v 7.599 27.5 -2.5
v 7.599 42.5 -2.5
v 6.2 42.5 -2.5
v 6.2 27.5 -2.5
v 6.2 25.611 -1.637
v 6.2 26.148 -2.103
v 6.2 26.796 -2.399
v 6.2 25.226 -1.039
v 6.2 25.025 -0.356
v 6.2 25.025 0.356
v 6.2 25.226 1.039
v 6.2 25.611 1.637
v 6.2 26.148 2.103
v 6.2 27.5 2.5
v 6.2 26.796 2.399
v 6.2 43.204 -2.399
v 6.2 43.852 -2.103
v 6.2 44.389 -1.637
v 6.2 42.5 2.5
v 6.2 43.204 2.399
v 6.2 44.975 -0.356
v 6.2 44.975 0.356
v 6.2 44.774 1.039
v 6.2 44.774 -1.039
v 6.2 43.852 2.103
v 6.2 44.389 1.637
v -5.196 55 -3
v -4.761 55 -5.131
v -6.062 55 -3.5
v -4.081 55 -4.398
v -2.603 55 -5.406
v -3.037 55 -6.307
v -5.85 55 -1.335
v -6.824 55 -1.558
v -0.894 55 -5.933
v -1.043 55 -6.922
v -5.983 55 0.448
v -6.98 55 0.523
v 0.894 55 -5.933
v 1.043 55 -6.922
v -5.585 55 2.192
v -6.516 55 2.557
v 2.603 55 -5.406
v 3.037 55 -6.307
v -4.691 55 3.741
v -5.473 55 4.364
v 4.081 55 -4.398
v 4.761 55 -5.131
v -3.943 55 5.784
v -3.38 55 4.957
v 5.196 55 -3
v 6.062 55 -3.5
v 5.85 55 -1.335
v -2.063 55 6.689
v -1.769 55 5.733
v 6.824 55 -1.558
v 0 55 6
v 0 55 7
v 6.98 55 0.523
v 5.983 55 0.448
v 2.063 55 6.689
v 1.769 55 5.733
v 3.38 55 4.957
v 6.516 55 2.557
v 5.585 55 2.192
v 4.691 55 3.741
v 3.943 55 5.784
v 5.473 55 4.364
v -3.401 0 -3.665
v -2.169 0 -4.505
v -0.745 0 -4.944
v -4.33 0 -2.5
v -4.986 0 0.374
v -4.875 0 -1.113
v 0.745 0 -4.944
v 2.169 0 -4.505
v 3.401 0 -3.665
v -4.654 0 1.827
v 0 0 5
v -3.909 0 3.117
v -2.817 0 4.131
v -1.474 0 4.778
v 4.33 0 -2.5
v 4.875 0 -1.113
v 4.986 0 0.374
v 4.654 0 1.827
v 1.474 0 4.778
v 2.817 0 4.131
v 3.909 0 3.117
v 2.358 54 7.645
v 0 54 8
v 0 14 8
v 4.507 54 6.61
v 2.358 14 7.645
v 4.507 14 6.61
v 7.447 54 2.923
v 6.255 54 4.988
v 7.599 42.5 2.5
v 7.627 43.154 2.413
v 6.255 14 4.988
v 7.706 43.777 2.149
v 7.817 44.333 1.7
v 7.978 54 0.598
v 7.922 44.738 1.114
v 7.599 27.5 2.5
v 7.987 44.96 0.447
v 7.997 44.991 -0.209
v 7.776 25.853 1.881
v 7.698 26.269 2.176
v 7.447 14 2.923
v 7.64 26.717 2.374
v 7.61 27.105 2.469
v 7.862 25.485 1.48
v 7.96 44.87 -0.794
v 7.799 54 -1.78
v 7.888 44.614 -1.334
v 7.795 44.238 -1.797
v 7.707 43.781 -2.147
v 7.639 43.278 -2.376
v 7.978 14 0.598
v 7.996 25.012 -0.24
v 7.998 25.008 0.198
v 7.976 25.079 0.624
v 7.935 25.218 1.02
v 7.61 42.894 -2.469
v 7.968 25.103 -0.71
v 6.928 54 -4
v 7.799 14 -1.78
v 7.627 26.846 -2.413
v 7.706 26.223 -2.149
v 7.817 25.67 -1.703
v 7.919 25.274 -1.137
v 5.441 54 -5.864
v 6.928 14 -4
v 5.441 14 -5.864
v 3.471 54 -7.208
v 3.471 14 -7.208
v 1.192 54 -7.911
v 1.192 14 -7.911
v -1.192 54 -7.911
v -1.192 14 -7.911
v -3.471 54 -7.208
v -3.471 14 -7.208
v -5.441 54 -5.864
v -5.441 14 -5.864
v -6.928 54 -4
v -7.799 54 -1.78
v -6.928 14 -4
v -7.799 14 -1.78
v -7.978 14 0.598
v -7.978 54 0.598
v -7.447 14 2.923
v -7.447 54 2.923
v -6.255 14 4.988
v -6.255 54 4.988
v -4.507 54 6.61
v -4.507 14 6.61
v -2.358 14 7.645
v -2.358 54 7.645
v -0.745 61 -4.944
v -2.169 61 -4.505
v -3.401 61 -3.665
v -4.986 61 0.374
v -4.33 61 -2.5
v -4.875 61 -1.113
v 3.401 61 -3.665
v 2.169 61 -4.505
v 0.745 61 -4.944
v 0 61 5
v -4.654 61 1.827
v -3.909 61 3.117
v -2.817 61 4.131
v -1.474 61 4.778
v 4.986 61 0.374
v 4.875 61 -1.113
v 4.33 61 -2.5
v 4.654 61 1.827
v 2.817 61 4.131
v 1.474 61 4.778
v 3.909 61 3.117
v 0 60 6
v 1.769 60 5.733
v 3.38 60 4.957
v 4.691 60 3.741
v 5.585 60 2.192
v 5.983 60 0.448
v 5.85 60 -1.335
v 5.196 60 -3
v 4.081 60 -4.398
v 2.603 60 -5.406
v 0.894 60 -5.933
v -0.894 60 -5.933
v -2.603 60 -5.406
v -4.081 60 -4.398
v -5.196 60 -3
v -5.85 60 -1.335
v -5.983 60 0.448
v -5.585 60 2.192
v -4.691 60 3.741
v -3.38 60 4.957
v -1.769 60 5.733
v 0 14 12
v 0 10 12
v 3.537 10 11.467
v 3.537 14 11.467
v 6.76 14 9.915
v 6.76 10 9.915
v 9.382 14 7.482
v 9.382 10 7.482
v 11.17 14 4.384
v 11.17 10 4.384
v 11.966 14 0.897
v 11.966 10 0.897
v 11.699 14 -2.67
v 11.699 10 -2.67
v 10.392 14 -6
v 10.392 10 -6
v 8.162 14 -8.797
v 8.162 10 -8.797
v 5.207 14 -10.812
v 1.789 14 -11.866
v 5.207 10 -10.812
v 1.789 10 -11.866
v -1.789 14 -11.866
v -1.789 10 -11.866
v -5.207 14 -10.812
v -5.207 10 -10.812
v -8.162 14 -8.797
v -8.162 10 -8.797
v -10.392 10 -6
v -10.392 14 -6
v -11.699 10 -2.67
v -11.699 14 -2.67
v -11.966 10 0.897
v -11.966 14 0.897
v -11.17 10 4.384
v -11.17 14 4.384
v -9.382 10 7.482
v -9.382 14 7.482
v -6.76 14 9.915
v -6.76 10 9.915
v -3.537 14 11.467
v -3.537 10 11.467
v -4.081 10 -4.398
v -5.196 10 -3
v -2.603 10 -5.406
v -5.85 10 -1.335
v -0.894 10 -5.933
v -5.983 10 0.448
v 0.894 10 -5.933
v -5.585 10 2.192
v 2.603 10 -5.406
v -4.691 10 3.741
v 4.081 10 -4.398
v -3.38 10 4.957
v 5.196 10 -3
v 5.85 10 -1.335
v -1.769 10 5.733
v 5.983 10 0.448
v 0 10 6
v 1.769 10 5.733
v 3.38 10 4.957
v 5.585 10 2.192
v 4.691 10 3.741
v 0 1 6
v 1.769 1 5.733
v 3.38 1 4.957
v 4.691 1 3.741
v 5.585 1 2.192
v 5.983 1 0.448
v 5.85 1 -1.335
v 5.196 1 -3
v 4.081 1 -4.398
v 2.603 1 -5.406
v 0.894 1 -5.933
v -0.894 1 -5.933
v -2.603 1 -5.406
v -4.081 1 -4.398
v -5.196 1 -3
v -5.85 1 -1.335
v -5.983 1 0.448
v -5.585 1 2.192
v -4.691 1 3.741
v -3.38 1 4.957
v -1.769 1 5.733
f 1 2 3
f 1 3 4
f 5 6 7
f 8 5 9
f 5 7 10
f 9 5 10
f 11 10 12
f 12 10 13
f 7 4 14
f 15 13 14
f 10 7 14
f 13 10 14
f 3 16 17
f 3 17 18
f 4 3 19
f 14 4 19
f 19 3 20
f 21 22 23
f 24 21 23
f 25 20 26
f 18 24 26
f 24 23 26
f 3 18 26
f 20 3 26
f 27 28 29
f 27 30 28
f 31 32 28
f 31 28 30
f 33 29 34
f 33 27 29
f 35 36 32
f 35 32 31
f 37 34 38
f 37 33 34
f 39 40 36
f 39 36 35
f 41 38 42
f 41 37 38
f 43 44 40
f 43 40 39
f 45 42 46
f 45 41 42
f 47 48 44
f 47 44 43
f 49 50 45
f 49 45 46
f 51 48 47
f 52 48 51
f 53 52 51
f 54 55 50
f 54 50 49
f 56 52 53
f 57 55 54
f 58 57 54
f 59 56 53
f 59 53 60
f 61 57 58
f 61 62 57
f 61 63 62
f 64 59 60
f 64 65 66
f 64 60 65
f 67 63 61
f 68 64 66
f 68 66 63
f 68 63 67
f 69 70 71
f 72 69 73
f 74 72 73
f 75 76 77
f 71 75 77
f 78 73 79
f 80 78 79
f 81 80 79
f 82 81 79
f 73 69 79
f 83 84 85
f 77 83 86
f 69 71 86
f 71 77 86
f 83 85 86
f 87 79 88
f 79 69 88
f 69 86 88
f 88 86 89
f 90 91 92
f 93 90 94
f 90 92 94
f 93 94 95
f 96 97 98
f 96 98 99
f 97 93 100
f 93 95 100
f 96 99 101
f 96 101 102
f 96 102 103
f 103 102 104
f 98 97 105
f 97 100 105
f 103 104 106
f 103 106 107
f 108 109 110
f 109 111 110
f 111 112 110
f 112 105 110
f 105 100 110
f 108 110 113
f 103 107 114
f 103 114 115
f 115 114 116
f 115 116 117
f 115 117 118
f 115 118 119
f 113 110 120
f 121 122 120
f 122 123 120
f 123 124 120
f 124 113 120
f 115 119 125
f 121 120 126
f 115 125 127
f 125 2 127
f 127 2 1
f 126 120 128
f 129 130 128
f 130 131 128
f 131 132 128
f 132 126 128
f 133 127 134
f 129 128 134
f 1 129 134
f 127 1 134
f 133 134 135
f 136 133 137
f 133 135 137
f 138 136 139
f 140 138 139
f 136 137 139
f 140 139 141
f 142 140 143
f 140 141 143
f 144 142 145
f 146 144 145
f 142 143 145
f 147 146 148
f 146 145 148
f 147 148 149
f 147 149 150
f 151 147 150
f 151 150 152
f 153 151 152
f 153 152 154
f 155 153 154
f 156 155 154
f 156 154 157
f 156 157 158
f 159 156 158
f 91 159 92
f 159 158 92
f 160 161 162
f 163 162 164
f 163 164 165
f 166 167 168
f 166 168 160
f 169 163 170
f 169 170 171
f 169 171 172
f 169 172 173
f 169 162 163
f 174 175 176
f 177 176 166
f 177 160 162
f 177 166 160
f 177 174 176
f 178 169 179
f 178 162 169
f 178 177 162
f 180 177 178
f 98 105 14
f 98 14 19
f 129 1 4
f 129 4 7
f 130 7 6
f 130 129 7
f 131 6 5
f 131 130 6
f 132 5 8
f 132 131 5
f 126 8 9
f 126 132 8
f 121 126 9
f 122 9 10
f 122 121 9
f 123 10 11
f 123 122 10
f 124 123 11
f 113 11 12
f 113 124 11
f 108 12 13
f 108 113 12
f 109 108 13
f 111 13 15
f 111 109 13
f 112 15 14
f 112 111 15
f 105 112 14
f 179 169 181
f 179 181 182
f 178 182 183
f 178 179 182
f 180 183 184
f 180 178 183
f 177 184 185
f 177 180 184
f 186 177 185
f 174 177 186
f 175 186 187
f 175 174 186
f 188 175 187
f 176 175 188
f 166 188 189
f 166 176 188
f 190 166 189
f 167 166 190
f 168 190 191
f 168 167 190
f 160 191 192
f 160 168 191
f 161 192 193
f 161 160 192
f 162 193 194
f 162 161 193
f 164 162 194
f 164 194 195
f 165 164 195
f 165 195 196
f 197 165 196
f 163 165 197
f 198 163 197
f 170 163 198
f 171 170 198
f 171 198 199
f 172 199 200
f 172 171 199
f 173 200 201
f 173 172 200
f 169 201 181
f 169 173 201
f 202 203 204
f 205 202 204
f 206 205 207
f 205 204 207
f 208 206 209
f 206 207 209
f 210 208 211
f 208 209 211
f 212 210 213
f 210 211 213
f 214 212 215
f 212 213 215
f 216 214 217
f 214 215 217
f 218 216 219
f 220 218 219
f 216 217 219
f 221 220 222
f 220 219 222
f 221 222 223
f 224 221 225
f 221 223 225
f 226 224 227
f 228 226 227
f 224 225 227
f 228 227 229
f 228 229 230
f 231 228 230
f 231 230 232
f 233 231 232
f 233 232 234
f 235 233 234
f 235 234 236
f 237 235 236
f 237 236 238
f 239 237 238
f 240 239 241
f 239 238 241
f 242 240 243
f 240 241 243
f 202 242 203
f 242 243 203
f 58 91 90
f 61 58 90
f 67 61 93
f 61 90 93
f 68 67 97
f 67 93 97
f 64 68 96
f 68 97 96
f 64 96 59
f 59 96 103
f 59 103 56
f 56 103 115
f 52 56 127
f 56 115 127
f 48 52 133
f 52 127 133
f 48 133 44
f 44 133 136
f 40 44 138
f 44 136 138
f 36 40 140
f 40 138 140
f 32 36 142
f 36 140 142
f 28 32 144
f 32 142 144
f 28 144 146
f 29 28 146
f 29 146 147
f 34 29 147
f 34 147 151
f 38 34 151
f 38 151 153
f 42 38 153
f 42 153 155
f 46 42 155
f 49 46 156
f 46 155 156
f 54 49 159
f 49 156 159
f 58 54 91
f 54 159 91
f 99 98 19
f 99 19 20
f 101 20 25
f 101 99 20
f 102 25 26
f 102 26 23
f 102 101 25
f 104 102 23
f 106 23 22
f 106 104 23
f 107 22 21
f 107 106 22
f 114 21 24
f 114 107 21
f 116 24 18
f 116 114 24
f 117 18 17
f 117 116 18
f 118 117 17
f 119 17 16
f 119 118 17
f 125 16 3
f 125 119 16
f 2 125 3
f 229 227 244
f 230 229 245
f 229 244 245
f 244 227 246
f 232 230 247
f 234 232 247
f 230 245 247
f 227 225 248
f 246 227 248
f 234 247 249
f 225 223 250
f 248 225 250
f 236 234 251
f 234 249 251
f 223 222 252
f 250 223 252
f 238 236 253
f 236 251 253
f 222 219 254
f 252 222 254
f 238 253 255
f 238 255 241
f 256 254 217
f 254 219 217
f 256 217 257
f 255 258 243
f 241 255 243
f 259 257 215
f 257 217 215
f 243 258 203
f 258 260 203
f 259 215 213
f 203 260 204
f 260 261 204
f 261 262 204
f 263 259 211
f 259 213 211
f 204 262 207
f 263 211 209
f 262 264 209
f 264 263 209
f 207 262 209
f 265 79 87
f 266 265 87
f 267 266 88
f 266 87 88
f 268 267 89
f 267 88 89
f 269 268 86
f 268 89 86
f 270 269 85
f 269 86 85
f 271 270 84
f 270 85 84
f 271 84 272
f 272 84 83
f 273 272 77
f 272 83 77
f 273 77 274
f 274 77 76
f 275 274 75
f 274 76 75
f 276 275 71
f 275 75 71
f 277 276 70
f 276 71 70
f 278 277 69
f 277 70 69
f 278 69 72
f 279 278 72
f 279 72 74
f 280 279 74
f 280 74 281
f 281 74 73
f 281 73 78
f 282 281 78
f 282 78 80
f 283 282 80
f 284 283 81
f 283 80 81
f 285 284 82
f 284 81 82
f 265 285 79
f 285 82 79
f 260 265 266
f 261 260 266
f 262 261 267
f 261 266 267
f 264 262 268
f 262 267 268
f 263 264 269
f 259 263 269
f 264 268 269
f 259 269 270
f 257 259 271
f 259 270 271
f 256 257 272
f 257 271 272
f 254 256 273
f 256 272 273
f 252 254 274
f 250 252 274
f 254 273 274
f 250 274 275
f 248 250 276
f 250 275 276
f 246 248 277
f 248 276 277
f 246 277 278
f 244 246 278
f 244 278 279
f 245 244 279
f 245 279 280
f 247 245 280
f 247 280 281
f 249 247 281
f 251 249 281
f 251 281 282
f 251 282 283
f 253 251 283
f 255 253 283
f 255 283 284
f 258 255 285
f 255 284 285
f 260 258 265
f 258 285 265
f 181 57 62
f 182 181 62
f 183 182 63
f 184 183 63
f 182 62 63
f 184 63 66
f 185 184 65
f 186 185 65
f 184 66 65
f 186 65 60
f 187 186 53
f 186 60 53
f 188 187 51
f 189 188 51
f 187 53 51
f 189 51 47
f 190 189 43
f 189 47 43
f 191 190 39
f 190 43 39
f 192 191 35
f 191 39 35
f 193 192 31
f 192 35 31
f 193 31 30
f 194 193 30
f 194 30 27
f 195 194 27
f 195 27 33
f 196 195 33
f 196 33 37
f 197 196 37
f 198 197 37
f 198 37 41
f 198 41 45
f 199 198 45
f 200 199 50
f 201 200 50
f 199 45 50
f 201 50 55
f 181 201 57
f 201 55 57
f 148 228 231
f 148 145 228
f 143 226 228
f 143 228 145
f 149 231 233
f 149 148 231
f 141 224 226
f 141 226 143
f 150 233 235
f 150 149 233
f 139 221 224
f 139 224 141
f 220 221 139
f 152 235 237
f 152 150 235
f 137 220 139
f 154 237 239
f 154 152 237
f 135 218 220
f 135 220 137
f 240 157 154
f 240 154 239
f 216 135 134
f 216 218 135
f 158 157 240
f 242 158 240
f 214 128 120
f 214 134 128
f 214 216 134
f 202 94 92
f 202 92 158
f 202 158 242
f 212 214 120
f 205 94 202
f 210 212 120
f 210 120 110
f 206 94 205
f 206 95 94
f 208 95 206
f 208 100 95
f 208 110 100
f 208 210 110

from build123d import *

# Parameters (mm, degrees)
SKETCH1_R           = 6
BOSS_EXTRUDE1_DEPTH = 10
SKETCH2_R           = 12
BOSS_EXTRUDE2_DEPTH = 4
SKETCH3_R           = 8
BOSS_EXTRUDE3_DEPTH = 41
SKETCH4_R           = 6
BOSS_EXTRUDE4_DEPTH = 6
CHAMFER1_SIZE       = 1
CHAMFER2_SIZE       = 1
CHAMFER3_SIZE       = 1
CUT_EXTRUDE1_DEPTH  = 1.8


with BuildPart() as part:
    # Sketch1 → Boss-Extrude1 (new body)
    with BuildSketch(Plane(origin=(0, 0, 0), x_dir=(1, 0, 0), z_dir=(0, 1, 0))):
        with Locations(Location((0, 0, 0), (0, 0, 270))):
            Circle(SKETCH1_R)
    extrude(amount=BOSS_EXTRUDE1_DEPTH)

    # Sketch2 → Boss-Extrude2 (add)
    with BuildSketch(Plane(origin=(0, 10, 0), x_dir=(1, 0, 0), z_dir=(0, 1, 0))):
        with Locations(Location((0, 0, 0), (0, 0, 270))):
            Circle(SKETCH2_R)
    extrude(amount=BOSS_EXTRUDE2_DEPTH)

    # Sketch3 → Boss-Extrude3 (add)
    with BuildSketch(Plane(origin=(0, 14, 0), x_dir=(1, 0, 0), z_dir=(0, 1, 0))):
        with Locations(Location((0, 0, 0), (0, 0, 270))):
            Circle(SKETCH3_R)
    extrude(amount=BOSS_EXTRUDE3_DEPTH)

    # Sketch4 → Boss-Extrude4 (add)
    with BuildSketch(Plane(origin=(0, 55, 0), x_dir=(1, 0, 0), z_dir=(0, 1, 0))):
        with Locations(Location((0, 0, 0), (0, 0, 270))):
            Circle(SKETCH4_R)
    extrude(amount=BOSS_EXTRUDE4_DEPTH)

    # Chamfer1
    chamfer1_edges = [part.edges().sort_by_distance(p)[0] for p in [
        (0, 0, -6),
    ]]
    chamfer(chamfer1_edges, length=CHAMFER1_SIZE)

    # Chamfer2
    chamfer2_edges = [part.edges().sort_by_distance(p)[0] for p in [
        (0, 61, -6),
    ]]
    chamfer(chamfer2_edges, length=CHAMFER2_SIZE)

    # Chamfer3
    chamfer3_edges = [part.edges().sort_by_distance(p)[0] for p in [
        (0, 55, -8),
    ]]
    chamfer(chamfer3_edges, length=CHAMFER3_SIZE)

    # Sketch5 → Cut-Extrude1 (cut)
    with BuildSketch(Plane(origin=(8, 0, 0), x_dir=(0, 0, -1), z_dir=(1, 0, 0))):
        with BuildLine():
            Line((2.5, 42.5), (2.5, 27.5))
            ThreePointArc((2.5, 27.5), (0, 25), (-2.5, 27.5))
            Line((-2.5, 27.5), (-2.5, 42.5))
            ThreePointArc((-2.5, 42.5), (0, 45), (2.5, 42.5))
        make_face()
    extrude(amount=-CUT_EXTRUDE1_DEPTH, mode=Mode.SUBTRACT)


solid = part.part
